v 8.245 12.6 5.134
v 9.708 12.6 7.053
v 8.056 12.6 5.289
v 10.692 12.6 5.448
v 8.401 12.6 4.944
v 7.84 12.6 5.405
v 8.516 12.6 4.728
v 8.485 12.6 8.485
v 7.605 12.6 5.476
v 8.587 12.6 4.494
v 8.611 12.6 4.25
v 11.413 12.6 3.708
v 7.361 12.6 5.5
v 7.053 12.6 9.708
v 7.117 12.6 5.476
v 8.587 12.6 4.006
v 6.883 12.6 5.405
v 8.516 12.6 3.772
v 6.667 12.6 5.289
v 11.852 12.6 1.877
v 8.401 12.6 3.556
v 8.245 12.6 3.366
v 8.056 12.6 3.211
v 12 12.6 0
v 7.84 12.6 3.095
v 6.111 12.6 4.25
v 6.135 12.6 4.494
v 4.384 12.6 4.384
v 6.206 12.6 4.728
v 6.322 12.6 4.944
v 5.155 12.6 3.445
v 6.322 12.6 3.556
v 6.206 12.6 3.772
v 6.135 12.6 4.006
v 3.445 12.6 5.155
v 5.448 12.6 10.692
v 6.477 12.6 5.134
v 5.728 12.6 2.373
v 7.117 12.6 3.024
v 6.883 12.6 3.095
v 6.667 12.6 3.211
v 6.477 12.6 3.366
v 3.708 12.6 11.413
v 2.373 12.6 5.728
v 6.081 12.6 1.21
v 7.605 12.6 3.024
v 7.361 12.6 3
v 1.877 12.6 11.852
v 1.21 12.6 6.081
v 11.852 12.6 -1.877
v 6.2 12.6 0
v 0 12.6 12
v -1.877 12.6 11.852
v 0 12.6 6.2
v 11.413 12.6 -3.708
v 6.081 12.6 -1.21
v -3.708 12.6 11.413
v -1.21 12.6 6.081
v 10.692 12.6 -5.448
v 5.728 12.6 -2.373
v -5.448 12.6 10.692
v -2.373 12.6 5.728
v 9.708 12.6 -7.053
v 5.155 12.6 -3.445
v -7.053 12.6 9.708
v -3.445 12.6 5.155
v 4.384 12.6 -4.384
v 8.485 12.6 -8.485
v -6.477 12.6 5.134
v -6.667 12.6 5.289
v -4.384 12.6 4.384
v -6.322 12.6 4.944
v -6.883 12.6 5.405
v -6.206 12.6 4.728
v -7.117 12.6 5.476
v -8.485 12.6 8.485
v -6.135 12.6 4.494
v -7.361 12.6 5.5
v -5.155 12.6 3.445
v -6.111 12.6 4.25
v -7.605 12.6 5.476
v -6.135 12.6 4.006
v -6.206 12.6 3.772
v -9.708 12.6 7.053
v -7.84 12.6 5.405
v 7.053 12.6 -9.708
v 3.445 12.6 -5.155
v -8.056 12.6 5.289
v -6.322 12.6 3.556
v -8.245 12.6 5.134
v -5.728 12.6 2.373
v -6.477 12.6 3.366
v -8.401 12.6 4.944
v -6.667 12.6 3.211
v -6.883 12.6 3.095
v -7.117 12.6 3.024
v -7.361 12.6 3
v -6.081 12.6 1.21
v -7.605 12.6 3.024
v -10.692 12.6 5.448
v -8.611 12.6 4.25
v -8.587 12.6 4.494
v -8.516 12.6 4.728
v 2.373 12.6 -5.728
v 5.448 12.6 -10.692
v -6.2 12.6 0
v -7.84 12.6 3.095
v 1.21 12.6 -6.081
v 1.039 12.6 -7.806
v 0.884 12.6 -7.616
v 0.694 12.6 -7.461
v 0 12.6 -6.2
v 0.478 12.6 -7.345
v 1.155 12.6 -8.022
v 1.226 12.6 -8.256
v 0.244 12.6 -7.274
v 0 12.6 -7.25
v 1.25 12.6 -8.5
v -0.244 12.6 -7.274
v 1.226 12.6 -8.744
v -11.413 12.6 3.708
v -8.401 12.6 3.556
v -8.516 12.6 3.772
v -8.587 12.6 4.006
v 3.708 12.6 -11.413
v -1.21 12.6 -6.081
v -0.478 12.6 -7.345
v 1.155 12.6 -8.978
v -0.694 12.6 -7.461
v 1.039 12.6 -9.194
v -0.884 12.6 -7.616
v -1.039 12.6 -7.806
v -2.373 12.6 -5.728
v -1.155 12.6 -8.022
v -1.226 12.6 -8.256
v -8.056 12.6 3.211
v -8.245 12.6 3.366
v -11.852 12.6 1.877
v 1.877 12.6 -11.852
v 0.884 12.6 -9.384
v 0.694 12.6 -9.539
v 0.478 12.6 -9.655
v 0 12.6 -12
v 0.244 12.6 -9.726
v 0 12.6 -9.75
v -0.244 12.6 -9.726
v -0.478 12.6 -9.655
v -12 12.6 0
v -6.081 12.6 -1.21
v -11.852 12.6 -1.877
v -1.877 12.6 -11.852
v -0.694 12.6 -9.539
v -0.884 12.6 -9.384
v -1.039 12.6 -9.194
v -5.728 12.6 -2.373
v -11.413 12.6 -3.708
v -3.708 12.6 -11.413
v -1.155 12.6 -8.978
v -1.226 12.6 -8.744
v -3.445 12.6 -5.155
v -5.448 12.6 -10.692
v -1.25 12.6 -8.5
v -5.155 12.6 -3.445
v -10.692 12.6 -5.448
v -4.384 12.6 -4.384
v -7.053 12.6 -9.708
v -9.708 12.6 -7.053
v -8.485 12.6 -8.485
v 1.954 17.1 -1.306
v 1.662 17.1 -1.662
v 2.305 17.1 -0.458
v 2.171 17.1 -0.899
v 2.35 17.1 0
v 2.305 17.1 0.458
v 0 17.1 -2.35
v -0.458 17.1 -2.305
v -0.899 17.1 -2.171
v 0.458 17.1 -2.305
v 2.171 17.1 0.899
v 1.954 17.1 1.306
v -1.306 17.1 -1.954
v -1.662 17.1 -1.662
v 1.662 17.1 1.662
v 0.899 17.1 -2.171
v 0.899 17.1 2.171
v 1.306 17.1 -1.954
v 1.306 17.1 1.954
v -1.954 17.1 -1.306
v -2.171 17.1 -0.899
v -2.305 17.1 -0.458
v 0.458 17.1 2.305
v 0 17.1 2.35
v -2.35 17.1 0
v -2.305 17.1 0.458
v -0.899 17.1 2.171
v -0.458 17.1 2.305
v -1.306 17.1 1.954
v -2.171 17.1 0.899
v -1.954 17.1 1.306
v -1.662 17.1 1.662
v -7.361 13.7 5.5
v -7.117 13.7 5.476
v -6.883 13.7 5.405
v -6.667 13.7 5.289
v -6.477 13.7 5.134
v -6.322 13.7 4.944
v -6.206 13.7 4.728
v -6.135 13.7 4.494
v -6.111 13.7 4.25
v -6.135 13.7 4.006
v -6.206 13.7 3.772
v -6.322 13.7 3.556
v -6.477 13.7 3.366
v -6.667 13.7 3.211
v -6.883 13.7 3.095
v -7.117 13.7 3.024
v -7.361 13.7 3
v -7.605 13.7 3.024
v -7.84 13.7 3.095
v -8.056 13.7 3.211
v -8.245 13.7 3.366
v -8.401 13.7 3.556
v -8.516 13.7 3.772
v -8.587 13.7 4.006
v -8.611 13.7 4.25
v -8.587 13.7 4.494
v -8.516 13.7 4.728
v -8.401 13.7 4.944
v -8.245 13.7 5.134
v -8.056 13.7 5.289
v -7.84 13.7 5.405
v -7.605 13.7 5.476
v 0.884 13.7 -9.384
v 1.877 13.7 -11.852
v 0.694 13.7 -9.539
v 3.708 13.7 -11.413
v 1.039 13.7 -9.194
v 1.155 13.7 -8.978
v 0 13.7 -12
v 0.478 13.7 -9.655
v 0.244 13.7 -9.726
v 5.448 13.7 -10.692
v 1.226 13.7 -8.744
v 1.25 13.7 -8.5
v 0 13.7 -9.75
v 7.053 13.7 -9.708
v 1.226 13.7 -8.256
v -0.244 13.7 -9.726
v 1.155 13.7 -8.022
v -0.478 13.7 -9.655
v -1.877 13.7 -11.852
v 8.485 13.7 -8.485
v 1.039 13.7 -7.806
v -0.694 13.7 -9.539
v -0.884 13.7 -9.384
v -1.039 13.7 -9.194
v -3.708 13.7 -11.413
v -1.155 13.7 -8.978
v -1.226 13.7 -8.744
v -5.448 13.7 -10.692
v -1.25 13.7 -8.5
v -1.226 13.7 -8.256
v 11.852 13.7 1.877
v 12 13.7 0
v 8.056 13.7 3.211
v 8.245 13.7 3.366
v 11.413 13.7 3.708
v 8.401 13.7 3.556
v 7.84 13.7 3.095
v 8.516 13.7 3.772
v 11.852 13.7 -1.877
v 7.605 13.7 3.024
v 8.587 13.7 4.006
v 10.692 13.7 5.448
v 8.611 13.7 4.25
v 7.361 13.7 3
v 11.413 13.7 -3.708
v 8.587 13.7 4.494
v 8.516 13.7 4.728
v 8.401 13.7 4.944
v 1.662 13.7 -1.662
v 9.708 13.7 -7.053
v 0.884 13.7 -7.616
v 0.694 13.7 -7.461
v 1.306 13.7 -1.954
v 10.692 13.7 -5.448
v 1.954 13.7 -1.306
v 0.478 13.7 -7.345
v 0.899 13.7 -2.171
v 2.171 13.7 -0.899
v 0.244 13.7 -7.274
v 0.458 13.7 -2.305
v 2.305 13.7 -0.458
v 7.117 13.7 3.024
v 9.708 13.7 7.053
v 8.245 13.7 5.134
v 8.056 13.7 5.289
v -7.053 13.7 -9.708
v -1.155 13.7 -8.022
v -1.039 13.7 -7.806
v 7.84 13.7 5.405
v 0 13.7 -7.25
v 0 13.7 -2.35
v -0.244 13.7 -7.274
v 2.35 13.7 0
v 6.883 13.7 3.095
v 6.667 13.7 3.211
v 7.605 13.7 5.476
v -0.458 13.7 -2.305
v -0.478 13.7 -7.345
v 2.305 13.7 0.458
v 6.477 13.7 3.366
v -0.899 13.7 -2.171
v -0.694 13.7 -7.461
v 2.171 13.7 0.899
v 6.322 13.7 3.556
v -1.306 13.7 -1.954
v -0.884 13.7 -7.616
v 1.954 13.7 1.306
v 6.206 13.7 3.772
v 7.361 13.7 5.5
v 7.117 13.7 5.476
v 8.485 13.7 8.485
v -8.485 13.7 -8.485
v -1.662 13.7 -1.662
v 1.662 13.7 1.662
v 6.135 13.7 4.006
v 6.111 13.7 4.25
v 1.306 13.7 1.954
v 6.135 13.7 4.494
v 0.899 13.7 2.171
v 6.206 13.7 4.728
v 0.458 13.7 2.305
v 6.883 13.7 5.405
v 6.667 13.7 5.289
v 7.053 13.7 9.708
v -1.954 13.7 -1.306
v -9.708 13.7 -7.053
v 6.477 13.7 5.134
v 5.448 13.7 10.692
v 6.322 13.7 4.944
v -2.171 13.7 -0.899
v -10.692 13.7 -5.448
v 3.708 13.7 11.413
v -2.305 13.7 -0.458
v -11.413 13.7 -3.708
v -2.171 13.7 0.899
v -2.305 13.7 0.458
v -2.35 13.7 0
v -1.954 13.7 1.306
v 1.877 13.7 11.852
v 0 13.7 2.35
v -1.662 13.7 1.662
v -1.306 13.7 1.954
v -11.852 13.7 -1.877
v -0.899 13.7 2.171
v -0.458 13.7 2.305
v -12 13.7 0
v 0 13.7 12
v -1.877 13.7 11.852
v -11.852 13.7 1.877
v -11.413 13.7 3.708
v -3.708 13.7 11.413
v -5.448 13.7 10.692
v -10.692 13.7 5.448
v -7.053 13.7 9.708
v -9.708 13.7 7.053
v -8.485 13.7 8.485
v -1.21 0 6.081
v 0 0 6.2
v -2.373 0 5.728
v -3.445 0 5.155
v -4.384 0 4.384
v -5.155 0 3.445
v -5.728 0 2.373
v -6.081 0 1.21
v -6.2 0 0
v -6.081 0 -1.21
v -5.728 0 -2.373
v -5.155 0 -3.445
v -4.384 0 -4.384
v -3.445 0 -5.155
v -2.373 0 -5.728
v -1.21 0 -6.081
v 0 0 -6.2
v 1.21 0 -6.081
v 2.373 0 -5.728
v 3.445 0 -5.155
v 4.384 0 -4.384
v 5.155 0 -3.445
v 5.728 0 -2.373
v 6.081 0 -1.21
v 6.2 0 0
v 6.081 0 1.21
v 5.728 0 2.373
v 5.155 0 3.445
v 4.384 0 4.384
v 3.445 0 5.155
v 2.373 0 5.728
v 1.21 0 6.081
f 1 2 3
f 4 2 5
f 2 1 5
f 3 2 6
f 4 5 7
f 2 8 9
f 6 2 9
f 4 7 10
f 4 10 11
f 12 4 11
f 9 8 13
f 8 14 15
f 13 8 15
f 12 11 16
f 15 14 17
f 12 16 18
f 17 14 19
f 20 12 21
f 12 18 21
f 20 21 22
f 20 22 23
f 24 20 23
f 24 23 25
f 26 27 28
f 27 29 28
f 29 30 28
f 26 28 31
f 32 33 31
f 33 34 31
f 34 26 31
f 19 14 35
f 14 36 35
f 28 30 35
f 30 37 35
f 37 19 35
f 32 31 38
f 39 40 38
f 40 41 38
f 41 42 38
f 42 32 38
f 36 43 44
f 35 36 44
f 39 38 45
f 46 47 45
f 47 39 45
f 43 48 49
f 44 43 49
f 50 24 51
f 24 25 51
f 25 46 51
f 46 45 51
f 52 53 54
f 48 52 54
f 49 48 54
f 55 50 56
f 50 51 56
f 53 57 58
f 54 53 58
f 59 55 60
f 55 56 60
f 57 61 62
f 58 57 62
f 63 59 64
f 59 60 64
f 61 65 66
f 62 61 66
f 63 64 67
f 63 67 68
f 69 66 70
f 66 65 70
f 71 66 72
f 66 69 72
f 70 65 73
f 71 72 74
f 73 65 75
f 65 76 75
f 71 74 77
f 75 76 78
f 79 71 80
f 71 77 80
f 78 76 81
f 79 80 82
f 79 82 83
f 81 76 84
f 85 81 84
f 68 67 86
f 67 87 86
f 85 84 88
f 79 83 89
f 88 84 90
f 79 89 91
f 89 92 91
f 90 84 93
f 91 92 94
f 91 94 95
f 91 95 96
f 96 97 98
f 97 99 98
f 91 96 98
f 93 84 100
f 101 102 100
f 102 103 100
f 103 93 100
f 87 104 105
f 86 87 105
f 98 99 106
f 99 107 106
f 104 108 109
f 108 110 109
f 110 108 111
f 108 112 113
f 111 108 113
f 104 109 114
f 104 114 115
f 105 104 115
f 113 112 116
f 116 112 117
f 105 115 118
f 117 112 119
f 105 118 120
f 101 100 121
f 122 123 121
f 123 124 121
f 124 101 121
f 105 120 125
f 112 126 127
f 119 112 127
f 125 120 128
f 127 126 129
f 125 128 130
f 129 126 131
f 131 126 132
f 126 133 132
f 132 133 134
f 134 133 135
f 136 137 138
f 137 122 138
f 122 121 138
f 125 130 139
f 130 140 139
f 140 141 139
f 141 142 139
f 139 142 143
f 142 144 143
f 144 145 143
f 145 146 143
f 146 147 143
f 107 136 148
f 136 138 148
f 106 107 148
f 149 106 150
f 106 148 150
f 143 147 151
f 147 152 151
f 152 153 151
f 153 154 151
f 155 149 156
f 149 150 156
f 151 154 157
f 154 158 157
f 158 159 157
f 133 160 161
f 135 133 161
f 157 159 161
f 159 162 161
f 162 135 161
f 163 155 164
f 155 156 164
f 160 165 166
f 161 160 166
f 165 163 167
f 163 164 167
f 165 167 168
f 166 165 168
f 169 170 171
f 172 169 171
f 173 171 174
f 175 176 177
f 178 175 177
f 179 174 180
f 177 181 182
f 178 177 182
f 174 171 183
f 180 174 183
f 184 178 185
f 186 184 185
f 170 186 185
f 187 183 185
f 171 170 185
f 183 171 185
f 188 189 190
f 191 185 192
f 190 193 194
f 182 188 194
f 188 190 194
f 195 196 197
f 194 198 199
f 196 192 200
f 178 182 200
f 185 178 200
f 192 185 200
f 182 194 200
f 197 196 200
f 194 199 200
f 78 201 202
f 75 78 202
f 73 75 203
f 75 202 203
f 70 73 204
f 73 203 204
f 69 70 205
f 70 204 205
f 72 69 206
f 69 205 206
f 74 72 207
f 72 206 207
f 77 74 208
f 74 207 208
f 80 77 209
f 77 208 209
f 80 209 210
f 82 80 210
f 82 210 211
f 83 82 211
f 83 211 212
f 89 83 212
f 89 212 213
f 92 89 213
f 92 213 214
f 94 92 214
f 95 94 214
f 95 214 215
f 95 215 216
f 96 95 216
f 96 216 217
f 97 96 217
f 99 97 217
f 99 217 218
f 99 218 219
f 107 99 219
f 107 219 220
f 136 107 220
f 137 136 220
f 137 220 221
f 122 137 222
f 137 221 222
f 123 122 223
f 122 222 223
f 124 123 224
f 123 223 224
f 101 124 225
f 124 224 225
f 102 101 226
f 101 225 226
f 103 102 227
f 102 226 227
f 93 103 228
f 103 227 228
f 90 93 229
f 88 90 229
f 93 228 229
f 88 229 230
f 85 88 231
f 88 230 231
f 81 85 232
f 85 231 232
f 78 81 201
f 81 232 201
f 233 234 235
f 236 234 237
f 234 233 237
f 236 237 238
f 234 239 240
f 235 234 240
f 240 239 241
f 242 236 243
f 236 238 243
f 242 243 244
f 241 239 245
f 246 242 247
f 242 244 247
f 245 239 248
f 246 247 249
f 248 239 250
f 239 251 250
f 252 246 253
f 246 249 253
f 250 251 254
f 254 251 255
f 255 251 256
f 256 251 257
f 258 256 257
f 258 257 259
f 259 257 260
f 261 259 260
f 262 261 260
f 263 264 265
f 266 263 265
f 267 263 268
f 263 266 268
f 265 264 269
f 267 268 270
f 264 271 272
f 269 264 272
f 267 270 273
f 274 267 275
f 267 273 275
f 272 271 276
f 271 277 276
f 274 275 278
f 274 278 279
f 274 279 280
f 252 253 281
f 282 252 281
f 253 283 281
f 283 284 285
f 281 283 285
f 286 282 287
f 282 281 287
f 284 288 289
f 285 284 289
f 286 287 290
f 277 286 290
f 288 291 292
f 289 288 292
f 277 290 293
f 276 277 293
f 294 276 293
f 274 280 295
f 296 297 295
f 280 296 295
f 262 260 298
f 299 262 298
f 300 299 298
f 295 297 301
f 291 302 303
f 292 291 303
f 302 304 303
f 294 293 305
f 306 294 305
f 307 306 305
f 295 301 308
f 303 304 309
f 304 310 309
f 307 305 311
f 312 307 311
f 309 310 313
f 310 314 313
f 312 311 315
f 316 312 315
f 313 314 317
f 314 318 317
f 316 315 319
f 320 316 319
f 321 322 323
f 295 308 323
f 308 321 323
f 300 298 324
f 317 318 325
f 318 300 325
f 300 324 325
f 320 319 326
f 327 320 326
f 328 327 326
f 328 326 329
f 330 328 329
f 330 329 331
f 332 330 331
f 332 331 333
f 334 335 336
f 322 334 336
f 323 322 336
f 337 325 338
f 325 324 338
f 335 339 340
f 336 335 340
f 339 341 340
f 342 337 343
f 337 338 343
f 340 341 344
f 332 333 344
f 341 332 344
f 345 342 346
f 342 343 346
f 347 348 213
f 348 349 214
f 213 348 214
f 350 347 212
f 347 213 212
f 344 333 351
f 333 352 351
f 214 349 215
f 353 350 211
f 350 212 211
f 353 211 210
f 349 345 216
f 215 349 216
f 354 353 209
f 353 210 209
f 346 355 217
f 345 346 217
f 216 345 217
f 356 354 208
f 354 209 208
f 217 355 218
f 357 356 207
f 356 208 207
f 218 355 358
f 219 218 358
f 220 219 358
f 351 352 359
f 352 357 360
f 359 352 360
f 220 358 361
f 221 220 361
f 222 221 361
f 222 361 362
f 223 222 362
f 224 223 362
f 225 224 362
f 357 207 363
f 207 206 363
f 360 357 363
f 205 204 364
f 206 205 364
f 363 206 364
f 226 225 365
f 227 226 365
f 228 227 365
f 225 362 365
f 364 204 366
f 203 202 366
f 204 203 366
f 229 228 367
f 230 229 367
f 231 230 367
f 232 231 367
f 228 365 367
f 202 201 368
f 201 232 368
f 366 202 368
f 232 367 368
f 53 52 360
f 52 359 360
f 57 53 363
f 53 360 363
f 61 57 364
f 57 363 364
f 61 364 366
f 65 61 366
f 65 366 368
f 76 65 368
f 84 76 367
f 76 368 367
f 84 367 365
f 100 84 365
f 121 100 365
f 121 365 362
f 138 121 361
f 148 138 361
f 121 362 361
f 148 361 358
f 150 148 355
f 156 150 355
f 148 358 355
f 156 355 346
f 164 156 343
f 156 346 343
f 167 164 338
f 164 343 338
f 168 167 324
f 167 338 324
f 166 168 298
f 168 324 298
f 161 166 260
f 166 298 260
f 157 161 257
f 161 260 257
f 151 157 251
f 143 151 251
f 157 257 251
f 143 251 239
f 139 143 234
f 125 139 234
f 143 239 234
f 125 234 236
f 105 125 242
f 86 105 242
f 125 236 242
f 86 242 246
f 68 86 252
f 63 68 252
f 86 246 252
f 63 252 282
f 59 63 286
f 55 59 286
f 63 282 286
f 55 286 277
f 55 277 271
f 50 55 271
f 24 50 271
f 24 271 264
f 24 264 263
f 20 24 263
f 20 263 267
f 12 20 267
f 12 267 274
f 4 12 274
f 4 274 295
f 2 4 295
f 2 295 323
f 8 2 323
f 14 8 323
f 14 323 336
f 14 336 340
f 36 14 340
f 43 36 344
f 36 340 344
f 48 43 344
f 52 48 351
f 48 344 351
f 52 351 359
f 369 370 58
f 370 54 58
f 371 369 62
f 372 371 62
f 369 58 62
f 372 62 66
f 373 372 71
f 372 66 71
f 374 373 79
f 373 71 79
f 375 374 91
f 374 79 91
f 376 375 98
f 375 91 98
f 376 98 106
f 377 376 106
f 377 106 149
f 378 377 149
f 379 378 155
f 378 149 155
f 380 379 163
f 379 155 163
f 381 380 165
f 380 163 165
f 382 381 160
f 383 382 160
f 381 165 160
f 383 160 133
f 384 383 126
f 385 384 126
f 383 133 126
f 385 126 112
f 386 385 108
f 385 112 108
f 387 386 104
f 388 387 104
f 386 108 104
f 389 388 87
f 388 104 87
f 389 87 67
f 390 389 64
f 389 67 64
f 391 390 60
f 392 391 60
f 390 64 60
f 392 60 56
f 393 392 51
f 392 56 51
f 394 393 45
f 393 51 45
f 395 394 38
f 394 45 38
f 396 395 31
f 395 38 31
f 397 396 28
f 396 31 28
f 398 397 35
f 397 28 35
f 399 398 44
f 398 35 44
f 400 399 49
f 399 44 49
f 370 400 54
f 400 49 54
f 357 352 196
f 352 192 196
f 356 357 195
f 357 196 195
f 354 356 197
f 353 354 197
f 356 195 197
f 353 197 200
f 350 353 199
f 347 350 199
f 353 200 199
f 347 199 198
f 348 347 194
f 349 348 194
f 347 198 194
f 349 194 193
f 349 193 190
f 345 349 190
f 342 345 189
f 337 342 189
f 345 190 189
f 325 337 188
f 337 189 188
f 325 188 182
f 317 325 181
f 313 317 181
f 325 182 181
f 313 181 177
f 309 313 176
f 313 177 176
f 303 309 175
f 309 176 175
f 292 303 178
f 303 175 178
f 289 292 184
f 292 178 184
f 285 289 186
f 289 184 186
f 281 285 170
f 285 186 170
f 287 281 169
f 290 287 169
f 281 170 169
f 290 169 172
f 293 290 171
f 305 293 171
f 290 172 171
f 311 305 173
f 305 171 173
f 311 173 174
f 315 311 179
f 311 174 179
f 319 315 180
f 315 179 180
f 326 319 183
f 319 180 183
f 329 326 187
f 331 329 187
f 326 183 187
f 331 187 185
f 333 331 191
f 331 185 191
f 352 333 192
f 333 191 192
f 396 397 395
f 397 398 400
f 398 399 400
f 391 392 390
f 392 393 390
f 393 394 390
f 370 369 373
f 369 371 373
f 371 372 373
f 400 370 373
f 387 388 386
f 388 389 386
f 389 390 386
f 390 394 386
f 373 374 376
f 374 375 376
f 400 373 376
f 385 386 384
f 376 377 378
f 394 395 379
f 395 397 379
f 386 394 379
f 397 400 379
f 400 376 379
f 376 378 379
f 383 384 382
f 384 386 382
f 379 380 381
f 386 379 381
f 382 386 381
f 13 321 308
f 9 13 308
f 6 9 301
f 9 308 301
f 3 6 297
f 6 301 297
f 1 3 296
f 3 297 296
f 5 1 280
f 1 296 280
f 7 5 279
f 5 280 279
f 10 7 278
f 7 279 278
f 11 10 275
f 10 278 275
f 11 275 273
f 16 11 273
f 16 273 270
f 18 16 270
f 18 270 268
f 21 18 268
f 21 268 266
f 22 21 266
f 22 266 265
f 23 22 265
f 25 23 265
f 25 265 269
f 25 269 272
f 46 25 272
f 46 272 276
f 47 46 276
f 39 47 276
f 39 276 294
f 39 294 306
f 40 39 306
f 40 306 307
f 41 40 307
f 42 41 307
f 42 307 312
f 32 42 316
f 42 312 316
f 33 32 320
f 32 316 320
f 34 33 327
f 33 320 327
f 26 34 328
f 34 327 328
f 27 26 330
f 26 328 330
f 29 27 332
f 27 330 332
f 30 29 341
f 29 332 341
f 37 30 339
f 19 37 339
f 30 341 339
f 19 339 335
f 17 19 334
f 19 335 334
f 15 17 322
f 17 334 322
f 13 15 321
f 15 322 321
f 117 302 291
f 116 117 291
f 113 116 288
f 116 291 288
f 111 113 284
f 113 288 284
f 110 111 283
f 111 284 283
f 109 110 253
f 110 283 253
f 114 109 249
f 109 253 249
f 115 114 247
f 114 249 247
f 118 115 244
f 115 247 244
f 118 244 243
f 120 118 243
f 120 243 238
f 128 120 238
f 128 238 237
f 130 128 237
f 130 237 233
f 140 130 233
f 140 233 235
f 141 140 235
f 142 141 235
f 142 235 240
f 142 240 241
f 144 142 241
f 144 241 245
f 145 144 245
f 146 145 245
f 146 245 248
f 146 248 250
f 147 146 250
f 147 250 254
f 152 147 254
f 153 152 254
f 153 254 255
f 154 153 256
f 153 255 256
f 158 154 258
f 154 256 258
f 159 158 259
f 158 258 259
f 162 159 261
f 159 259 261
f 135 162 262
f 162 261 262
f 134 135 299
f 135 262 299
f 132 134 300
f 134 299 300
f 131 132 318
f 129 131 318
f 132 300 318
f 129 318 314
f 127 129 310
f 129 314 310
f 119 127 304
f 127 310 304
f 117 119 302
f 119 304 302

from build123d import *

# Parameters (mm, degrees)
CUT_EXTRUDE1_REACH = 23.81
SKETCH2_R          = 1.25


with BuildPart() as part:
    # Sketch1 → Revolve1 (revolve)
    with BuildSketch(Plane.XY, mode=Mode.PRIVATE) as revolve1_sk:
        Polygon((0, 0), (-6.2, 0), (-6.2, 12.6), (-12, 12.6), (-12, 13.7), (-2.35, 13.7), (-2.35, 17.1), (0, 17.1), align=None)
    revolve(revolve1_sk.sketch.rotate(Axis((0, 17.1, 0), (0, -1, 0)), 270), axis=Axis((0, 17.1, 0), (0, -1, 0)))

    # Sketch2 → Cut-Extrude1 (cut, up to next)
    with BuildSketch(Plane(origin=(0, 13.7, 0), x_dir=(1, 0, 0), z_dir=(0, 1, 0)), mode=Mode.PRIVATE) as cut_extrude1_sk1:
        with Locations(Location((0, 8.5, 0), (0, 0, 270))):
            Circle(SKETCH2_R)
    cut_extrude1_tool1 = extrude(cut_extrude1_sk1.sketch, amount=-CUT_EXTRUDE1_REACH, mode=Mode.PRIVATE) & part.part
    # Sketch2 → Cut-Extrude1 (cut, up to next)
    with BuildSketch(Plane(origin=(0, 13.7, 0), x_dir=(1, 0, 0), z_dir=(0, 1, 0)), mode=Mode.PRIVATE) as cut_extrude1_sk2:
        with Locations(Location((7.361215932, -4.25, 0), (0, 0, 270))):
            Circle(SKETCH2_R)
    cut_extrude1_tool2 = extrude(cut_extrude1_sk2.sketch, amount=-CUT_EXTRUDE1_REACH, mode=Mode.PRIVATE) & part.part
    # Sketch2 → Cut-Extrude1 (cut, up to next)
    with BuildSketch(Plane(origin=(0, 13.7, 0), x_dir=(1, 0, 0), z_dir=(0, 1, 0)), mode=Mode.PRIVATE) as cut_extrude1_sk3:
        with Locations(Location((-7.361215932, -4.25, 0), (0, 0, 270))):
            Circle(SKETCH2_R)
    cut_extrude1_tool3 = extrude(cut_extrude1_sk3.sketch, amount=-CUT_EXTRUDE1_REACH, mode=Mode.PRIVATE) & part.part
    add(cut_extrude1_tool1.solids().sort_by_distance((0, 13.7, -8.5))[0], mode=Mode.SUBTRACT)
    add(cut_extrude1_tool2.solids().sort_by_distance((7.361216, 13.7, 4.25))[0], mode=Mode.SUBTRACT)
    add(cut_extrude1_tool3.solids().sort_by_distance((-7.361216, 13.7, 4.25))[0], mode=Mode.SUBTRACT)


solid = part.part
